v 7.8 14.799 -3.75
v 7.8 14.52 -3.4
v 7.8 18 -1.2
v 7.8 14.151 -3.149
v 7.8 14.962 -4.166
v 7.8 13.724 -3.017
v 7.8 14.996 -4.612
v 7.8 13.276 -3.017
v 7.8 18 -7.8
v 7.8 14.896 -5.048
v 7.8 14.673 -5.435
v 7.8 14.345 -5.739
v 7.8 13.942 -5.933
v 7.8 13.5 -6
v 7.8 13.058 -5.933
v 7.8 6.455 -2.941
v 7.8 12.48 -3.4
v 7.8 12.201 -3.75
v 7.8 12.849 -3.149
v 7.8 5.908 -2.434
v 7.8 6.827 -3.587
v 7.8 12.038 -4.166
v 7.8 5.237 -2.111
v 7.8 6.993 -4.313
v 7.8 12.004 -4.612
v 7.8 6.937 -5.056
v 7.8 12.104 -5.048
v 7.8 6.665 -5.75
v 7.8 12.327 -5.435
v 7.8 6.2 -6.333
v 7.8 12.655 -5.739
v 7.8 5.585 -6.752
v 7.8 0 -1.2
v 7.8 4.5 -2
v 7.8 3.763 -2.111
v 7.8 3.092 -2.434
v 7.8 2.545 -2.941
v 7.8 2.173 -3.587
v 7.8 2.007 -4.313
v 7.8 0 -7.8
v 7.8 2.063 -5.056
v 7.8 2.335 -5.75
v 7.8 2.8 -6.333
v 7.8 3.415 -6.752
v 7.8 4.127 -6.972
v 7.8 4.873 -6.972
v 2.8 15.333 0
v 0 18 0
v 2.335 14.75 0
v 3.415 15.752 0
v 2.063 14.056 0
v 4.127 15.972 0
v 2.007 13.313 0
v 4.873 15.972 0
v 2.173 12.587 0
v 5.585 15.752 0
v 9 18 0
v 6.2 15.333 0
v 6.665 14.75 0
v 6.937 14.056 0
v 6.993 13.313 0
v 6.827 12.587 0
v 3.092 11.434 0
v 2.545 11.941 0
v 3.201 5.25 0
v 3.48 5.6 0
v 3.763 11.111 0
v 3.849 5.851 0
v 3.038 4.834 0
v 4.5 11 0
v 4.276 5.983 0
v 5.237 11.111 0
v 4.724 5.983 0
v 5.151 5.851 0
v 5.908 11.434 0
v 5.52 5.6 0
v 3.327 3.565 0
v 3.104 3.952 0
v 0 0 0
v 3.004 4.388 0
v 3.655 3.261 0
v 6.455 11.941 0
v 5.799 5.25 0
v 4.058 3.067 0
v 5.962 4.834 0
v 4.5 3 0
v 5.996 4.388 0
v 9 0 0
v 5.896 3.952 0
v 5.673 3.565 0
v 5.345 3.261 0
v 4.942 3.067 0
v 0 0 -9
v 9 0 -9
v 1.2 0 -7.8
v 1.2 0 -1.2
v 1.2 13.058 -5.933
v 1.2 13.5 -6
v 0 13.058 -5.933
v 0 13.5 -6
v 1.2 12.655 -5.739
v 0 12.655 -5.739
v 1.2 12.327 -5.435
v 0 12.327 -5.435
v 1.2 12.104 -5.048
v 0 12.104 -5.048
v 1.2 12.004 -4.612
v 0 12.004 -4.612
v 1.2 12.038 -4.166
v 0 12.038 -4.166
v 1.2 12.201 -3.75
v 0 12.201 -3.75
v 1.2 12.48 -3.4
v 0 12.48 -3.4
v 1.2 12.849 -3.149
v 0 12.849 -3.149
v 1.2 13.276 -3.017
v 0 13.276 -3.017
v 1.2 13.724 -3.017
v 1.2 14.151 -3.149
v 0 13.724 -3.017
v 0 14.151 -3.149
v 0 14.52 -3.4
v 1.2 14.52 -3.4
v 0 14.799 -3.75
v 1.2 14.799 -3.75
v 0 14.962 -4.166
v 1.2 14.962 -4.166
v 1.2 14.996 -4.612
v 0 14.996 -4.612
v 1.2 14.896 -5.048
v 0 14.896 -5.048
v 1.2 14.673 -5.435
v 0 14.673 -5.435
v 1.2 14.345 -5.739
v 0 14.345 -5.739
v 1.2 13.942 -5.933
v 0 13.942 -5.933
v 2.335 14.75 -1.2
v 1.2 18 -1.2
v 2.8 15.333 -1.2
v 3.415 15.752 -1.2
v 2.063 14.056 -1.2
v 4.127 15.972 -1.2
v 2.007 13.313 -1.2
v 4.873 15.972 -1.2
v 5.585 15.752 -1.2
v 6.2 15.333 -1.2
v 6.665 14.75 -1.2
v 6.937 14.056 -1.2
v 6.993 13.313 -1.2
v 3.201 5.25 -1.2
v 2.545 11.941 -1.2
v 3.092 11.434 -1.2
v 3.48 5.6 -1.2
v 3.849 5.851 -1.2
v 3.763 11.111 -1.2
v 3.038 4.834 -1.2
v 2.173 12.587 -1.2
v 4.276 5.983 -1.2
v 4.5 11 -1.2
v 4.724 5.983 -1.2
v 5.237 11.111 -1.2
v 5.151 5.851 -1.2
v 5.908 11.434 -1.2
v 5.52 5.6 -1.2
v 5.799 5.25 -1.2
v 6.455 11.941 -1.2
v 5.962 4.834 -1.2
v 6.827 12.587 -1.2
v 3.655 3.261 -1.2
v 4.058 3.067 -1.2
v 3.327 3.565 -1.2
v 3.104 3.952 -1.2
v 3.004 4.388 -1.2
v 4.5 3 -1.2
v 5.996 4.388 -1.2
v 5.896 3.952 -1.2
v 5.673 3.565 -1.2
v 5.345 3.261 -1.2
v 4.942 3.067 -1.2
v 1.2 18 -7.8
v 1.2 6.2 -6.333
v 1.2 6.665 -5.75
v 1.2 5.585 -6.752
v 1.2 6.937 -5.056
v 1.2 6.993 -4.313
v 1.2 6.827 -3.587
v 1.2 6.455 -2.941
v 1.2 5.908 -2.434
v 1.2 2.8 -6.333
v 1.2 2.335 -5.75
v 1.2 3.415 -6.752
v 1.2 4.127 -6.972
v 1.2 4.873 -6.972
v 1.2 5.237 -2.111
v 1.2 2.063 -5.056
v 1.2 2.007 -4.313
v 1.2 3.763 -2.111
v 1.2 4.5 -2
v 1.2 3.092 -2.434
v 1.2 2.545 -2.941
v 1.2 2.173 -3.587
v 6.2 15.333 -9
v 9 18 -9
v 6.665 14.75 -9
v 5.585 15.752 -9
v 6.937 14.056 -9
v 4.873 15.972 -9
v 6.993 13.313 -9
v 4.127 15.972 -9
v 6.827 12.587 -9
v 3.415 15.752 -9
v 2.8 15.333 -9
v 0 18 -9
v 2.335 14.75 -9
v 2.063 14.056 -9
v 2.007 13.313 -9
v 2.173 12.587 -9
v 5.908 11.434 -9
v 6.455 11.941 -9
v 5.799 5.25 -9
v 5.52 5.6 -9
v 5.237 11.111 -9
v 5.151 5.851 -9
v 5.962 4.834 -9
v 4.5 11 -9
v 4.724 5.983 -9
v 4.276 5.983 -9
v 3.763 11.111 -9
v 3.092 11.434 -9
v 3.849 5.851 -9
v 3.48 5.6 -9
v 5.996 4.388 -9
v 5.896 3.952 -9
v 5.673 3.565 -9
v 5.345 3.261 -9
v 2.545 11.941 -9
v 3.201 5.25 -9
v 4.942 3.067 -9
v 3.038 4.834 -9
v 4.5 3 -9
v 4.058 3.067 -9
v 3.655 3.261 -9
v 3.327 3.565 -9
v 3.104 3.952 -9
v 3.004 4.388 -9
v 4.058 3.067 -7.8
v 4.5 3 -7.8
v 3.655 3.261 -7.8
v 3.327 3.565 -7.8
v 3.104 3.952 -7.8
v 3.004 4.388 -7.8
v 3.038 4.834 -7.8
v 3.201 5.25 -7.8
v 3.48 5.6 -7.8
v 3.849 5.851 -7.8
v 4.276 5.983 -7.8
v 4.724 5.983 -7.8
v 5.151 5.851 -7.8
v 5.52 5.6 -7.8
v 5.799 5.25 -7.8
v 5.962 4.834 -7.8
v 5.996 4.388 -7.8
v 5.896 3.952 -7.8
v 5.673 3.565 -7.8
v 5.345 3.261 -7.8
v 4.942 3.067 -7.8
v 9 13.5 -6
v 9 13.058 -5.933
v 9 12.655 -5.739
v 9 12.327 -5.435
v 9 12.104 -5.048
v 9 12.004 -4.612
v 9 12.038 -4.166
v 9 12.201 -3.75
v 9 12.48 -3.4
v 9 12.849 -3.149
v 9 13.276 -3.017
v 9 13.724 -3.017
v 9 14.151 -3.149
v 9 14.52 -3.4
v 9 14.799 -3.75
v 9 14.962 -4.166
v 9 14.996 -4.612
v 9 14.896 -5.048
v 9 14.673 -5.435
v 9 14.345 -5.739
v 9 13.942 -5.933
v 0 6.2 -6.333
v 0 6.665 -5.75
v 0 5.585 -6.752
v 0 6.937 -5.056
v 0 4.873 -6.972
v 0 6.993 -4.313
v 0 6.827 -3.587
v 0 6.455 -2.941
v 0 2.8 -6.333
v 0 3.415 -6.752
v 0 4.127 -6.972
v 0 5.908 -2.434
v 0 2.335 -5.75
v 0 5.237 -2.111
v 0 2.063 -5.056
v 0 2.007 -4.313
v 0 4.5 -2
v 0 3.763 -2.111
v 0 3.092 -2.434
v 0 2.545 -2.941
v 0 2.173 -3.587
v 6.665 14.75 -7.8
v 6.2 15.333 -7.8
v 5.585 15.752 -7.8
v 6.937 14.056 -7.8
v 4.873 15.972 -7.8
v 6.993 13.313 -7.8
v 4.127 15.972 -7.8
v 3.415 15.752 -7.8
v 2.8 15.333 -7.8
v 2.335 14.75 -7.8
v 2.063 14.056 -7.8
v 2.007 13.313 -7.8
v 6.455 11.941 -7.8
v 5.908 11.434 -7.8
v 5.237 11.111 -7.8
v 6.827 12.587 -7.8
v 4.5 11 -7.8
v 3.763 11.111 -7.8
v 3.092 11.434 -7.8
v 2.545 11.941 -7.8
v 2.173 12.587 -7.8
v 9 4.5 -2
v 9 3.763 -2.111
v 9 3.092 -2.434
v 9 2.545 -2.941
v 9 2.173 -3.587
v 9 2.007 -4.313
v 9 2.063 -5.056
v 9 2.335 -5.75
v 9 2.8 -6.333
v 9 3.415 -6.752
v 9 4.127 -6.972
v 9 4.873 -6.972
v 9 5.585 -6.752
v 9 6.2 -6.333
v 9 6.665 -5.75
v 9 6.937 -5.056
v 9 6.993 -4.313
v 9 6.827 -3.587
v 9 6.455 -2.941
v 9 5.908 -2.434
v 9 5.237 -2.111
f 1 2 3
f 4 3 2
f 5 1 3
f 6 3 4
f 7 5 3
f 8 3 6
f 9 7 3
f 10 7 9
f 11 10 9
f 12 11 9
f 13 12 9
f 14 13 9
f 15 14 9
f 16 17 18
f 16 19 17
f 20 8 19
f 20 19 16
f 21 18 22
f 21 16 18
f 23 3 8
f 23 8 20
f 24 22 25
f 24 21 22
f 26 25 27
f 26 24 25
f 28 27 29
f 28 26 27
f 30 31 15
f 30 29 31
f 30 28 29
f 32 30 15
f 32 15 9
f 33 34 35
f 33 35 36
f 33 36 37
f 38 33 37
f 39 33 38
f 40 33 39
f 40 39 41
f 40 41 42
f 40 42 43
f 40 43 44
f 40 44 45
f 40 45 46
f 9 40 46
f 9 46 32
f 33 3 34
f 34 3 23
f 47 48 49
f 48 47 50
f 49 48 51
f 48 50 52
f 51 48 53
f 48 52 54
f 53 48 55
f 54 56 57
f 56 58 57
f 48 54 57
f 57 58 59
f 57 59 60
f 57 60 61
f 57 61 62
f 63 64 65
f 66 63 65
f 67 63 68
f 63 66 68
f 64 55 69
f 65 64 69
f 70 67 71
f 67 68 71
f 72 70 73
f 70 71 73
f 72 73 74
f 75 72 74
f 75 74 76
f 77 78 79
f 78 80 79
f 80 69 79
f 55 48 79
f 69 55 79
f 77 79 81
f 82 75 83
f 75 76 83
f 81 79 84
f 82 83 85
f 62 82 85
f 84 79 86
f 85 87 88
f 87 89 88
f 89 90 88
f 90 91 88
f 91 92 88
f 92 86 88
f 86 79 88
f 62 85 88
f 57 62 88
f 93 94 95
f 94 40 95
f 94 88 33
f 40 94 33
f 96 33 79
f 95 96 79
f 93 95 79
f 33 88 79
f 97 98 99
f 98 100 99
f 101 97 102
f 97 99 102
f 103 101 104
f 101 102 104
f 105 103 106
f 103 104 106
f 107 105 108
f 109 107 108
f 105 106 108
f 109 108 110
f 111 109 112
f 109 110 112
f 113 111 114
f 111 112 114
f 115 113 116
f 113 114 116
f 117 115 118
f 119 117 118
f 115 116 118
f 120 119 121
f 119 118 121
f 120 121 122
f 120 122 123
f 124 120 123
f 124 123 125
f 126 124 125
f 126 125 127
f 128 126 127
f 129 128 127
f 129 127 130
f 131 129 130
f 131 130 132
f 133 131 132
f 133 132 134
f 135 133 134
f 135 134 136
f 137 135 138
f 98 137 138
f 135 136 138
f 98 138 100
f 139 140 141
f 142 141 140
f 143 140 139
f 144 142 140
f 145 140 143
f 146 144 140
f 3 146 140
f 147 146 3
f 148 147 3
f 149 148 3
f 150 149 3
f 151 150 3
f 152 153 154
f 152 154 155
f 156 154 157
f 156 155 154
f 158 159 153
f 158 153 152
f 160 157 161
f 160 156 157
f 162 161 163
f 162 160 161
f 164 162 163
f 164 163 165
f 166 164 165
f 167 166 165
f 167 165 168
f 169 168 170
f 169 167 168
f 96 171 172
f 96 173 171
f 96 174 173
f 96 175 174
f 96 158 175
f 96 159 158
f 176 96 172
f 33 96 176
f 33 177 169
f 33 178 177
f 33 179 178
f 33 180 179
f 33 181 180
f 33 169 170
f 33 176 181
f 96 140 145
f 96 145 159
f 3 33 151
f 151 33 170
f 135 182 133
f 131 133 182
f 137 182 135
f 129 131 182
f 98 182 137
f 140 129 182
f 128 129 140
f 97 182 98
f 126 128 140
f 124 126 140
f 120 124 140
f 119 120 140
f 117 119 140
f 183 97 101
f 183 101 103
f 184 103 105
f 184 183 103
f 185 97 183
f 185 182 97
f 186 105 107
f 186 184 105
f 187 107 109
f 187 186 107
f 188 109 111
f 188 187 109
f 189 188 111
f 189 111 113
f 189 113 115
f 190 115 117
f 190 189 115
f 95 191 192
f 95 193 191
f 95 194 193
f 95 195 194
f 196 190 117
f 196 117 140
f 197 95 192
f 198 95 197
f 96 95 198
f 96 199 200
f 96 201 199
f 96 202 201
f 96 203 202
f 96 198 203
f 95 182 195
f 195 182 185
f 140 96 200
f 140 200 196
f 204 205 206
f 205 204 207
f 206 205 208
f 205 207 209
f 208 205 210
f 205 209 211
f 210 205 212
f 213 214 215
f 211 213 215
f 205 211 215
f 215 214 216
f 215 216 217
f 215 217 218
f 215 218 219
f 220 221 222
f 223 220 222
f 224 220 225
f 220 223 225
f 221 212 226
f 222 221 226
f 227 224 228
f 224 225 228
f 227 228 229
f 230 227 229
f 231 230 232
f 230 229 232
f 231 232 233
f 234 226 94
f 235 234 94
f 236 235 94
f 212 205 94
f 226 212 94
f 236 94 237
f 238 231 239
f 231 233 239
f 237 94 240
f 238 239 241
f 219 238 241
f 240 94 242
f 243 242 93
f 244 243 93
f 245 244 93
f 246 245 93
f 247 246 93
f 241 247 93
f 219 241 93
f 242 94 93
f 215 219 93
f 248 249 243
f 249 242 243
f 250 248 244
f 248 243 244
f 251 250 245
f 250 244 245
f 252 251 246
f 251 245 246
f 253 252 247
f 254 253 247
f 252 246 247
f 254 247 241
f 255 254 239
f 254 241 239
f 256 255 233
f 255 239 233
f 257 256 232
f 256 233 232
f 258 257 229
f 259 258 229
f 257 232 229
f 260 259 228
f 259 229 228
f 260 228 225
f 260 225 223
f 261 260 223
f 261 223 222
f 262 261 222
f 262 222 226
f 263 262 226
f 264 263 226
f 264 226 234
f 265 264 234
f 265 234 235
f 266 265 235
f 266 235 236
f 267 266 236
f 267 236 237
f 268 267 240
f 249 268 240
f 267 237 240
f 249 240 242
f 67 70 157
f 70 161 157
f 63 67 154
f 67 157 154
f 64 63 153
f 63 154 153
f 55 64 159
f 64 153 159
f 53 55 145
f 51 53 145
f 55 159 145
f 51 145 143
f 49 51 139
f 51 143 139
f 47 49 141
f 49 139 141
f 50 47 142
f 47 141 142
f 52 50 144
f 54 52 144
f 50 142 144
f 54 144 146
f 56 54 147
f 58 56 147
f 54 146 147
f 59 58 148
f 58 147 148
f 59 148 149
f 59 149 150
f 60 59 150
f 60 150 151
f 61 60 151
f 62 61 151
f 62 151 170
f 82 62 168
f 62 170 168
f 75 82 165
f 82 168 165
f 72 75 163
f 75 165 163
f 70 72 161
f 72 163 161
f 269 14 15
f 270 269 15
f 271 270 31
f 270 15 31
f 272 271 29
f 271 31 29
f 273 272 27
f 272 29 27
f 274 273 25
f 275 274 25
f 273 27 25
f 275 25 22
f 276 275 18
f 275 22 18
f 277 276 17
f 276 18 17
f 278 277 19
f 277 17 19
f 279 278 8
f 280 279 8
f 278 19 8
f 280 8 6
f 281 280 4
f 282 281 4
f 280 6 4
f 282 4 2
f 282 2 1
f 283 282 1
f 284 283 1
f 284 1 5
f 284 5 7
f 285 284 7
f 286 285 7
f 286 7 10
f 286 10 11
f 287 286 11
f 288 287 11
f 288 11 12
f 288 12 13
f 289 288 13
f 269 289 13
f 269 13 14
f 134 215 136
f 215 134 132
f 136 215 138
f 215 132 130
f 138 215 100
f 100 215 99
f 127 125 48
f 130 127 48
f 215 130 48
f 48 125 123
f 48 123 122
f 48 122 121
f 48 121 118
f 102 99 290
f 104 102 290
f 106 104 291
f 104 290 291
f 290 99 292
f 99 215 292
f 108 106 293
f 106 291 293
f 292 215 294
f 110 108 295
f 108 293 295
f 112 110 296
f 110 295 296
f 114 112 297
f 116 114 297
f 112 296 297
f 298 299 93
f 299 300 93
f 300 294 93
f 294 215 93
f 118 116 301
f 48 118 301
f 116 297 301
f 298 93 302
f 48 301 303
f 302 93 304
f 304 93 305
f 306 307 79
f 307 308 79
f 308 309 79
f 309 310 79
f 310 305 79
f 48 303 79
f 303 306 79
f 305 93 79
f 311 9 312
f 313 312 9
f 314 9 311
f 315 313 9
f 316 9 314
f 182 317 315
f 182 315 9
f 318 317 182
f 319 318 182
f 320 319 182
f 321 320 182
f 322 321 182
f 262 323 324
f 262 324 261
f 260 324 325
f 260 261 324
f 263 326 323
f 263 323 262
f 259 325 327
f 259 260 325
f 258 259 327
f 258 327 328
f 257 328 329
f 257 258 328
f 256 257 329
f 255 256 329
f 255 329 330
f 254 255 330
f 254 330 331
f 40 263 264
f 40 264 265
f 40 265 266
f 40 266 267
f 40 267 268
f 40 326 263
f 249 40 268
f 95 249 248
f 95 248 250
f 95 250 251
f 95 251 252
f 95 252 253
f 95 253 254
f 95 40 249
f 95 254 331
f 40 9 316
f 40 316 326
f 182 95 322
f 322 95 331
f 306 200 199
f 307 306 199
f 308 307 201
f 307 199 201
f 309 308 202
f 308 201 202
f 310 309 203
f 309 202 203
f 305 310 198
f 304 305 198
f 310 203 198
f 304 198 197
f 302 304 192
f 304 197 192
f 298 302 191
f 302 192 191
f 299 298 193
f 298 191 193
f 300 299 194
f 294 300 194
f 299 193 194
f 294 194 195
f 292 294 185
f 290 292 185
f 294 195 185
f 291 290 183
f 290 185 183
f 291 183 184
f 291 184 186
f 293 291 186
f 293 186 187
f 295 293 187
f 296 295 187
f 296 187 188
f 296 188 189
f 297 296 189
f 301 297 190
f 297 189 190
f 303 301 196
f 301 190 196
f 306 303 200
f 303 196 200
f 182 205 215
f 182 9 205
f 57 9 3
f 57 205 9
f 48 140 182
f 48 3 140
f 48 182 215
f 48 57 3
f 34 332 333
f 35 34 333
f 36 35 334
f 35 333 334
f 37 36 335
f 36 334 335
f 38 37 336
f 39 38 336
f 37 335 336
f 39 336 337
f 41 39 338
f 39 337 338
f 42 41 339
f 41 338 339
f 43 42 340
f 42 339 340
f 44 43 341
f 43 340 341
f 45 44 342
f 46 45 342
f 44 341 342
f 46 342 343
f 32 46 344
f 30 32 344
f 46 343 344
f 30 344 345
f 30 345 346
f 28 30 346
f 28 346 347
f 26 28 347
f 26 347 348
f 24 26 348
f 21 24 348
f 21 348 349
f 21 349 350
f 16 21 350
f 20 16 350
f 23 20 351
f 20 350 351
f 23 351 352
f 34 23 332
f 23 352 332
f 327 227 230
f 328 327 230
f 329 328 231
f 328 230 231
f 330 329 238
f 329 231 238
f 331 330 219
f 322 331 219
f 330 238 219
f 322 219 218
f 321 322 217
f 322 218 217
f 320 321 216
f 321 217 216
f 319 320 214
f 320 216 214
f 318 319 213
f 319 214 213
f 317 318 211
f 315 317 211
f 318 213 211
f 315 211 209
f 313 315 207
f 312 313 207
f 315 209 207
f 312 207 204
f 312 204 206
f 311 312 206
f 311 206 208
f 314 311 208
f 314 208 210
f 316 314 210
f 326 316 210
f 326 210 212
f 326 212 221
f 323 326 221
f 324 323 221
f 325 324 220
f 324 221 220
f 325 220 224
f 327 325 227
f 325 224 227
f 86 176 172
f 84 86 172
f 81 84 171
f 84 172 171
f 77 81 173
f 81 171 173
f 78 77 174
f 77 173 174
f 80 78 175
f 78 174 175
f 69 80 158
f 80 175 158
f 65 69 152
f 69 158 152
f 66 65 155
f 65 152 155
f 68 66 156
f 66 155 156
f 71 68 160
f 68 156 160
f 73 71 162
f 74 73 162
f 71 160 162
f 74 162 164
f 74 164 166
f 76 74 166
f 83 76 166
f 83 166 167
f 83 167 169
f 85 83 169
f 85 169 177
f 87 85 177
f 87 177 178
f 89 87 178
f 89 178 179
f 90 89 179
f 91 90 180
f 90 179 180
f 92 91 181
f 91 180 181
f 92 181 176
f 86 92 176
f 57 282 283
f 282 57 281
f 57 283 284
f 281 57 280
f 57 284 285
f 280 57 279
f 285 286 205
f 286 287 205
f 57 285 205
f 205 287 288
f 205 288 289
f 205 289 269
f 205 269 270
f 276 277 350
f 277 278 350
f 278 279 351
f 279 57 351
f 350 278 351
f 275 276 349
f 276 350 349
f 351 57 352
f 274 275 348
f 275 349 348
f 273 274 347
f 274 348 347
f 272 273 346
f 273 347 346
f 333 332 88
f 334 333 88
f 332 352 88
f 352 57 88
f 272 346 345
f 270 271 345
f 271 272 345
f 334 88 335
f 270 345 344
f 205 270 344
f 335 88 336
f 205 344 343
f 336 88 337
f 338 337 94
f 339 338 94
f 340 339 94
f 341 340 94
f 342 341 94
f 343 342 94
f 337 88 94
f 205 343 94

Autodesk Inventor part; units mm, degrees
ref_plane "YZ Plane" through (0, 0, 0) normal (1, 0, 0) x (0, 1, 0)
ref_plane "XZ Plane" through (0, 0, 0) normal (0, 1, 0) x (-1, 0, 0)
ref_plane "XY Plane" through (0, 0, 0) normal (0, 0, 1) x (1, 0, 0)
sketch "スケッチ1" plane through (0, 0, 0) normal (0, 1, 0) x (-1, 0, 0)
  line L0 (0, 0) -> (-9, 0)
  line L1 (-9, 0) -> (-9, -9)
  line L2 (-9, -9) -> (0, -9)
  line L3 (0, -9) -> (0, 0)
  line L4 (-1.2, -1.2) -> (-7.8, -1.2)
  line L5 (-7.8, -1.2) -> (-7.8, -7.8)
  line L6 (-7.8, -7.8) -> (-1.2, -7.8)
  line L7 (-1.2, -7.8) -> (-1.2, -1.2)
  dimension "d0" = 9
  dimension "d1" = 9
  dimension "d2" = 6.6
  dimension "d3" = 6.6
  dimension "d4" = 1.2
  dimension "d5" = 1.2
extrude "押し出し1" add sketch "スケッチ1" along normal blind 18
sketch "スケッチ2" plane through (0, 0, 0) normal (0, 0, 1) x (1, 0, 0)
  line L0 (0, 0) -> (9, 0) projected
  line L1 (7.8, 0) -> (7.8, 18) projected
  line L2 (9, 0) -> (9, 18) projected
  point P0 (4.5, 4.5)
  dimension "d8" = 4.5
  dimension "d26" = 4.5
hole "穴1" at (4.5, 4.5, 0) direction (0, 0, -1) diameter 3 end through all
sketch "スケッチ3" plane through (9, 0, 0) normal (1, 0, 0) x (0, 0, -1)
  line L0 (0, 18) -> (9, 18) projected
  line L1 (0, 0) -> (0, 18) projected
  point P0 (4.5, 13.5)
  dimension "d17" = 4.5
  dimension "d18" = 4.5
hole "穴2" at (9, 13.5, -4.5) direction (-1, 0, 0) diameter 3 end through all
sketch "スケッチ4" plane through (0, 0, 0) normal (0, 0, 1) x (1, 0, 0)
  line L0 (0, 18) -> (9, 18) projected
  line L1 (0, 0) -> (0, 18) projected
  point P0 (4.5, 13.5)
  dimension "d27" = 4.5
  dimension "d28" = 4.5
hole "穴3" at (4.5, 13.5, 0) direction (0, 0, -1) diameter 5 end through all
sketch "スケッチ5" plane through (0, 0, -9) normal (-1, 0, 0) x (0, 0, 1)
  line L0 (0, 0) -> (9, 0) projected
  line L1 (0, 0) -> (0, 18) projected
  point P0 (4.5, 4.5)
  dimension "d36" = 4.5
  dimension "d37" = 4.5
hole "穴4" at (0, 4.5, -4.5) direction (1, 0, 0) diameter 5 end through all
equation "\"d5\" = d4"
equation "\"d26\" = d8"
equation "\"d18\" = d17"
equation "\"d28\" = d27"
equation "\"d37\" = d36"
properties part number "ハンド9x9_5" material "アルミニウム 6061"
